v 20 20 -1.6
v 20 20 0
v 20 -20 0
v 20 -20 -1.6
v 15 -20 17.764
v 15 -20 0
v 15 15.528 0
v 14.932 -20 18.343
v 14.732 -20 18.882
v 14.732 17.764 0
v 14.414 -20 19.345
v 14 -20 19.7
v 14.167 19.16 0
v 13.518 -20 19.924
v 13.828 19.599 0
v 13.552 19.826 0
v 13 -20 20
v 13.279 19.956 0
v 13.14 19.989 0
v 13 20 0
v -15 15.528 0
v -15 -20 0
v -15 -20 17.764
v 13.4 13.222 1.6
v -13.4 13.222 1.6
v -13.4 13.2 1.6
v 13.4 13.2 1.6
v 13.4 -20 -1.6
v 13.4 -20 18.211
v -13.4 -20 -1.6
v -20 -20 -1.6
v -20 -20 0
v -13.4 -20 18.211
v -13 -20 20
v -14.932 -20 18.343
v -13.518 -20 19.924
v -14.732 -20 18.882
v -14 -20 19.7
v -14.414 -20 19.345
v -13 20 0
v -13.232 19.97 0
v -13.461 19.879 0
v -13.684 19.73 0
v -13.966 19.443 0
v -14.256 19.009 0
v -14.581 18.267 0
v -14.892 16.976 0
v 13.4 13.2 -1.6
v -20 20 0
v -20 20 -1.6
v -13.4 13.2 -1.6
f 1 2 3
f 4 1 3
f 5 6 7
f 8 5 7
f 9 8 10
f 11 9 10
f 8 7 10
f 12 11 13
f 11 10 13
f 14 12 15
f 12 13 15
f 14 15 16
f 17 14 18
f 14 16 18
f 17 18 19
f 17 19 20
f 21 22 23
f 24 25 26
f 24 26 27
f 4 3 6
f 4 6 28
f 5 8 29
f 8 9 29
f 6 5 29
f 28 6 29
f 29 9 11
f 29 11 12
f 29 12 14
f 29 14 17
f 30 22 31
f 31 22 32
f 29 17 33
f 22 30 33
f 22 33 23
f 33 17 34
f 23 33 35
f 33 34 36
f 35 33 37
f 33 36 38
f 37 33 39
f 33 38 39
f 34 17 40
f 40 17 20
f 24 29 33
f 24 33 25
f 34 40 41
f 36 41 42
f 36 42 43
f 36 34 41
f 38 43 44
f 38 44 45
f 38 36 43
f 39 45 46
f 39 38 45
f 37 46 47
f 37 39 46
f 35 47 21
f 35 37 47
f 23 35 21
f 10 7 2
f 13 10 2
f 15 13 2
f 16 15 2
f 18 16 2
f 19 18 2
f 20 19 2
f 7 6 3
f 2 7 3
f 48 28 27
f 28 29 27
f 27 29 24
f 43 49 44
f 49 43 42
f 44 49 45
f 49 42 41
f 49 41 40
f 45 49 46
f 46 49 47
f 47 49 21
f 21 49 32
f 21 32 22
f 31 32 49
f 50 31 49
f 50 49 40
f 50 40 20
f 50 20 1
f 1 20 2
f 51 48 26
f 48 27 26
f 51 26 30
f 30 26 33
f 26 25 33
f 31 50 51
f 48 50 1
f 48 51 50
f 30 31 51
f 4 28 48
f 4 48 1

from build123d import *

# Parameters (mm, degrees)
F0_W     = 30
F0_H     = 40
F1_DEPTH = 20
F3_DEPTH = 30.001
F4_T     = -1.6
F5_W     = 26.8
F5_H     = 33.2
F6_DEPTH = 1.6
F8_DEPTH = 1.6
F9_R     = 2


with BuildPart() as f1:
    # F0 (on Top) → F1 (new body)
    with BuildSketch(Plane.XY):
        Rectangle(F0_W, F0_H)
    extrude(amount=F1_DEPTH)

    # F2 (on face) → F3 (cut, through all)
    with BuildSketch(Plane.YZ.offset(15)):
        Polygon((20, 20), (-20, 20), (20, 0), align=None)
    extrude(amount=-F3_DEPTH, mode=Mode.SUBTRACT)

    # F4
    f4_openings = [f1.faces().sort_by_distance(p)[0] for p in [
        (0, -20, 10),
    ]]
    offset(amount=F4_T, openings=f4_openings)

    # F5 (on face) → F6 (cut)
    with BuildSketch(Plane(origin=(0, 0, 0), x_dir=(1, 0, 0), z_dir=(0, 0, -1))):
        with Locations((0, 3.4)):
            Rectangle(F5_W, F5_H)
    extrude(amount=-F6_DEPTH, mode=Mode.SUBTRACT)

    # F7 (on face) → F8 (join)
    with BuildSketch(Plane(origin=(0, 0, 0), x_dir=(1, 0, 0), z_dir=(0, 0, -1))):
        Polygon((-20, 20), (-20, -20), (20, -20), (20, 20), (13.4, 20), (13.4, -13.2), (-13.4, -13.2), (-13.4, 20), align=None)
    extrude(amount=F8_DEPTH)

    # F9
    f9_edges = [f1.edges().sort_by_distance(p)[0] for p in [
        (-15, 0, 10),
        (15, 0, 10),
    ]]
    fillet(f9_edges, radius=F9_R)


solid = f1.part
